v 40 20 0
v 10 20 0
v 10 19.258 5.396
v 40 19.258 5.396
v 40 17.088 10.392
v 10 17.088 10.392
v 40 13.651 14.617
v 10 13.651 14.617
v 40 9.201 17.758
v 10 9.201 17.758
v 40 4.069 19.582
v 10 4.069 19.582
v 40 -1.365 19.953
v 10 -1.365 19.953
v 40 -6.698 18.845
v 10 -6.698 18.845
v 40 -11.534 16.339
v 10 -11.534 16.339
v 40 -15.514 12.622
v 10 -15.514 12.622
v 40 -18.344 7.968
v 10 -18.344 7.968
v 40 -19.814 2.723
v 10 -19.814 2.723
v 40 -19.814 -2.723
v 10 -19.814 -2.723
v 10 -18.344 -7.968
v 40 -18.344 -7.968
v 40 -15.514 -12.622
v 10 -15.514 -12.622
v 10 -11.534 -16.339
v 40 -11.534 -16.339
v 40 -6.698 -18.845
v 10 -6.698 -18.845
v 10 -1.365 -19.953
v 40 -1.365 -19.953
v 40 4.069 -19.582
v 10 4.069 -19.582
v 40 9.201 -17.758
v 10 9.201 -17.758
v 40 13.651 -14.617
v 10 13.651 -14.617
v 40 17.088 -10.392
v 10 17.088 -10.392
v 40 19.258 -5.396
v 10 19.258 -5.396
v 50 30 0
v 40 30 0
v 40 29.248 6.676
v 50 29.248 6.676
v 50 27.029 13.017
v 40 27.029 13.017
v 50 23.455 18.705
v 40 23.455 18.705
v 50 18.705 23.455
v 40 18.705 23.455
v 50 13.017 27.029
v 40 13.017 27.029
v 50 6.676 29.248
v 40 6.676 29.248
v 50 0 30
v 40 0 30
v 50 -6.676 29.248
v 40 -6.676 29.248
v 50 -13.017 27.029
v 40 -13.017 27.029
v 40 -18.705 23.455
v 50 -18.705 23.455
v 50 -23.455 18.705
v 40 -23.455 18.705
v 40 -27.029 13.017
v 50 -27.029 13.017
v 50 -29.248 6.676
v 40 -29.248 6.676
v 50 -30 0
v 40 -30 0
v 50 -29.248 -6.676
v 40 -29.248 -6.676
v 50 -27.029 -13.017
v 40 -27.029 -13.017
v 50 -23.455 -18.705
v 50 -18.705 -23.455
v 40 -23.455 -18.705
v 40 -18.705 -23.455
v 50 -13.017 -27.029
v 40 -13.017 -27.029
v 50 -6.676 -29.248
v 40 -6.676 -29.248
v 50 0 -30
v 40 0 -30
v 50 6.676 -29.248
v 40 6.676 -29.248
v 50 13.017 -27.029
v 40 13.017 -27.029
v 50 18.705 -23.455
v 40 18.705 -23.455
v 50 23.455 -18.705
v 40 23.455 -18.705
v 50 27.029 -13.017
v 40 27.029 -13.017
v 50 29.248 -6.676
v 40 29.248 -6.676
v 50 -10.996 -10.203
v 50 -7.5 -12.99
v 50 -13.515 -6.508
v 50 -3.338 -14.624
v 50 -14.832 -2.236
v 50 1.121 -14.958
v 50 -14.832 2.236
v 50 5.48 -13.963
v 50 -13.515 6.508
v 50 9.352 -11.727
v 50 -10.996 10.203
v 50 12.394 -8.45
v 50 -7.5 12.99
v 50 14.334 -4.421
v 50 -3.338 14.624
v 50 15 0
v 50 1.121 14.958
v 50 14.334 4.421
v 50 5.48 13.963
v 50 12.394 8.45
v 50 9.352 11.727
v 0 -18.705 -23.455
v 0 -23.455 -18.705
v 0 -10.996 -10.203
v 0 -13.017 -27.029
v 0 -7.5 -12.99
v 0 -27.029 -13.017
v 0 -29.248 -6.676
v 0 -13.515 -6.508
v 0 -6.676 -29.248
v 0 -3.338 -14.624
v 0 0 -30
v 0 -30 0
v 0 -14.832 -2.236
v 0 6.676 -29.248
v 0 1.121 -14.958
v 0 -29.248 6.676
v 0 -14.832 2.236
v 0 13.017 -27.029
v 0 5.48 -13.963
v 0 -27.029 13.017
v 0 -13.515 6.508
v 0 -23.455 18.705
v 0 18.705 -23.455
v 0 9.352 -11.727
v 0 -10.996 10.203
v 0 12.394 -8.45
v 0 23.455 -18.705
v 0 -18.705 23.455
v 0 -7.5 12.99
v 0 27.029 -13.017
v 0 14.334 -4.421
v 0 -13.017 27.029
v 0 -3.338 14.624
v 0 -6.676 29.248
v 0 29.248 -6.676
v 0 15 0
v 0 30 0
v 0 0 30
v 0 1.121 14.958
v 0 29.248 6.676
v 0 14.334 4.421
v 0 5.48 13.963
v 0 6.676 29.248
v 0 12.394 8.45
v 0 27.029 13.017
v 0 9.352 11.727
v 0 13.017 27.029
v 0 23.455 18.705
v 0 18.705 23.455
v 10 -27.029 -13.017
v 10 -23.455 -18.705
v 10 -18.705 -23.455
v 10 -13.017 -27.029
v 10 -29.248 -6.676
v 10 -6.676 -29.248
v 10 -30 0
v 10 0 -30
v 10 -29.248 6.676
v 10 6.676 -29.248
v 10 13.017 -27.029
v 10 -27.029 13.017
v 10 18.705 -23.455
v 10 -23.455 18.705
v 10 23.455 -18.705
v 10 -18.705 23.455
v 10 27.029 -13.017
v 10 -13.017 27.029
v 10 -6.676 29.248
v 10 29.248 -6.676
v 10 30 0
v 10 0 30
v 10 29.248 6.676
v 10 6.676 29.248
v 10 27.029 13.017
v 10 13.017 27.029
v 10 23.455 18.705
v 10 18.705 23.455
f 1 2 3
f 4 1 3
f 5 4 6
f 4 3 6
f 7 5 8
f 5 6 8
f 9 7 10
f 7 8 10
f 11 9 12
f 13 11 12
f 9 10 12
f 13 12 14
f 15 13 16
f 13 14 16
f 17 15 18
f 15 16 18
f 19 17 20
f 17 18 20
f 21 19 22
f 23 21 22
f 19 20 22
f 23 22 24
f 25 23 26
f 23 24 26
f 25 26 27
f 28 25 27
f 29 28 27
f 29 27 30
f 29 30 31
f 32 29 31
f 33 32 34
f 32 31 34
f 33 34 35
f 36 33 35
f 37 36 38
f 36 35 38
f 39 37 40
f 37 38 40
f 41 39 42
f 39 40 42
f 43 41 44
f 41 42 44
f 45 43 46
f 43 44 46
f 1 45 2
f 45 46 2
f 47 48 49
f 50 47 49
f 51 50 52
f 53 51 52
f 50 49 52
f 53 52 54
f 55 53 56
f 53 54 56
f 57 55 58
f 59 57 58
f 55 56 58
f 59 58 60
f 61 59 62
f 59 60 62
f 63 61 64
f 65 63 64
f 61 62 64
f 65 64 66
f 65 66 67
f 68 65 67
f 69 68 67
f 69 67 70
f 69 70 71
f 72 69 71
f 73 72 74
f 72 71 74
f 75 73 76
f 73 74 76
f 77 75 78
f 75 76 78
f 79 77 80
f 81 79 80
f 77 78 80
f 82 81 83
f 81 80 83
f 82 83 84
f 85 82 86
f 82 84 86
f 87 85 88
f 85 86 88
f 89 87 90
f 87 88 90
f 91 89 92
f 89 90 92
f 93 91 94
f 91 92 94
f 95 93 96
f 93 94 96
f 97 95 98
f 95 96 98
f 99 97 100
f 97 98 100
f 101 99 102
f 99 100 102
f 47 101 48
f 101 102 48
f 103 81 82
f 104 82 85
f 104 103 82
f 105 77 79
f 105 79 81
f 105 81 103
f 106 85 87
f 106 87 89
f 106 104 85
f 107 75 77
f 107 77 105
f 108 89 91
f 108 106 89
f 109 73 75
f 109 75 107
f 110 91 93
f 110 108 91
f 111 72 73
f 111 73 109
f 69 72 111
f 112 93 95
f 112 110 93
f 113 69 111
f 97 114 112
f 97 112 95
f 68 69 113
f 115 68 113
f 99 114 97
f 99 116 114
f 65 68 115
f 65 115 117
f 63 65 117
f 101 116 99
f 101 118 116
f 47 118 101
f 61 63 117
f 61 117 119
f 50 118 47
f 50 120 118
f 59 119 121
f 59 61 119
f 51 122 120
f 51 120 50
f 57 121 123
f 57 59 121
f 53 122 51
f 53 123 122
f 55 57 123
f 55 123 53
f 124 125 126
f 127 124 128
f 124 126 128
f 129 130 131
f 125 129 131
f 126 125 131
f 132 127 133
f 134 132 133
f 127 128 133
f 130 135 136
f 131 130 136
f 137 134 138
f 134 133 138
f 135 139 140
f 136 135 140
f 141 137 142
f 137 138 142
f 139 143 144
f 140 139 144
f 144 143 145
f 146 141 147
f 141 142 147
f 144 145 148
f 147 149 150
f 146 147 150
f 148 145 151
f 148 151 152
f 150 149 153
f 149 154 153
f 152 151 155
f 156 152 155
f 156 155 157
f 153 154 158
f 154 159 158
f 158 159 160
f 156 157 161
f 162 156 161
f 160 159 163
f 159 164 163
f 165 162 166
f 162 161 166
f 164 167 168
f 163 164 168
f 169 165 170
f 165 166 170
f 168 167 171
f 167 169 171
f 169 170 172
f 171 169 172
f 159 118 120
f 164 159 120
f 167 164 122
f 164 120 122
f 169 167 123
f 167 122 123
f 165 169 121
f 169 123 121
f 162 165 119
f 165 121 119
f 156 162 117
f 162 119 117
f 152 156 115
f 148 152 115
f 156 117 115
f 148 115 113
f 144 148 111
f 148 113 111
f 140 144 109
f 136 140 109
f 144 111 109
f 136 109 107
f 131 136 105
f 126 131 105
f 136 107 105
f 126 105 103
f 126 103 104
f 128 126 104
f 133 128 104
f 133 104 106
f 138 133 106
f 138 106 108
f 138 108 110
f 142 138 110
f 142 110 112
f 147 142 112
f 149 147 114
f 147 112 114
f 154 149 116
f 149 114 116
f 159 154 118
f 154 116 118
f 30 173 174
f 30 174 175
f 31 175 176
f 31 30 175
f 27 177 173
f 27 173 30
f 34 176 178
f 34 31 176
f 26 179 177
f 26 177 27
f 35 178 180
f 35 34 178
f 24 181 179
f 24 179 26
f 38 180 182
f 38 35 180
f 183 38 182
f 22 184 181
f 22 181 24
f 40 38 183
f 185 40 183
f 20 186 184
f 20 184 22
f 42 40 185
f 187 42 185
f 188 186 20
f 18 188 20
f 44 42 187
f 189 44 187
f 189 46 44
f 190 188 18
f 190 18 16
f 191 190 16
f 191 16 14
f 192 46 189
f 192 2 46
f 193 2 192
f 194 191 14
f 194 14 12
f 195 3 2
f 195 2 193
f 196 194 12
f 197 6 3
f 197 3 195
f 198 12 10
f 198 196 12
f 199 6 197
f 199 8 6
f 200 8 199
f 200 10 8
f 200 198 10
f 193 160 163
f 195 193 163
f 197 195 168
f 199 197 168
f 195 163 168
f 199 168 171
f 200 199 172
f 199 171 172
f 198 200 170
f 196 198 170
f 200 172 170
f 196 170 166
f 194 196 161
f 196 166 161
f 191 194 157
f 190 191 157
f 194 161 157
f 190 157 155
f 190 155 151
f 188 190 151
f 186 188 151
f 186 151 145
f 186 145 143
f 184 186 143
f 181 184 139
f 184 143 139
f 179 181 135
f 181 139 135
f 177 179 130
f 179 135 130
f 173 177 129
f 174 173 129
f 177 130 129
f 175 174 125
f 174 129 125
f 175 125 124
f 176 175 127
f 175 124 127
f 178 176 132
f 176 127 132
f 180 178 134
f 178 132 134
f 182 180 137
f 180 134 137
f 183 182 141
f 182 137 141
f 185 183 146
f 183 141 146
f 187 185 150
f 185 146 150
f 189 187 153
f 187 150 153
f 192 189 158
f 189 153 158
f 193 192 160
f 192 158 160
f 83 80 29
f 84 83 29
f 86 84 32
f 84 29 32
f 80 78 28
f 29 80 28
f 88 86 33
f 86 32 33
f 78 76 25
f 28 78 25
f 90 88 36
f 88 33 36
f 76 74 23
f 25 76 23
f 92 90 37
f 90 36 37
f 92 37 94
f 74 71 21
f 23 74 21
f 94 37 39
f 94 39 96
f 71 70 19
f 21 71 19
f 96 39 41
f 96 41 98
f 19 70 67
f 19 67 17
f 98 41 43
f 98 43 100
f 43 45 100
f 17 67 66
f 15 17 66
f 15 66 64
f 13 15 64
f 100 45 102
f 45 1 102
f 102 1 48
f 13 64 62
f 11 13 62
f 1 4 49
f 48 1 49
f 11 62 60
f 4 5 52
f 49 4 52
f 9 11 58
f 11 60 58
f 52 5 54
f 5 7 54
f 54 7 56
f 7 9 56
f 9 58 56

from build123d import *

# Parameters (mm, degrees)
F0_R     = 30
F1_DEPTH = 10
F2_R     = 20
F3_DEPTH = 30
F4_R     = 30
F5_DEPTH = 10
F6_R     = 15
F7_DEPTH = 50


with BuildPart() as f1:
    # F0 (on Right) → F1 (new body)
    with BuildSketch(Plane.YZ):
        Circle(F0_R)
    extrude(amount=F1_DEPTH)

    # F2 (on face) → F3 (join)
    with BuildSketch(Plane.YZ.offset(10)):
        Circle(F2_R)
    extrude(amount=F3_DEPTH)

    # F4 (on face) → F5 (join)
    with BuildSketch(Plane.YZ.offset(40)):
        Circle(F4_R)
    extrude(amount=F5_DEPTH)

    # F6 (on face) → F7 (cut, through all)
    with BuildSketch(Plane.YZ.offset(50)):
        Circle(F6_R)
    extrude(amount=-F7_DEPTH, mode=Mode.SUBTRACT)


solid = f1.part
